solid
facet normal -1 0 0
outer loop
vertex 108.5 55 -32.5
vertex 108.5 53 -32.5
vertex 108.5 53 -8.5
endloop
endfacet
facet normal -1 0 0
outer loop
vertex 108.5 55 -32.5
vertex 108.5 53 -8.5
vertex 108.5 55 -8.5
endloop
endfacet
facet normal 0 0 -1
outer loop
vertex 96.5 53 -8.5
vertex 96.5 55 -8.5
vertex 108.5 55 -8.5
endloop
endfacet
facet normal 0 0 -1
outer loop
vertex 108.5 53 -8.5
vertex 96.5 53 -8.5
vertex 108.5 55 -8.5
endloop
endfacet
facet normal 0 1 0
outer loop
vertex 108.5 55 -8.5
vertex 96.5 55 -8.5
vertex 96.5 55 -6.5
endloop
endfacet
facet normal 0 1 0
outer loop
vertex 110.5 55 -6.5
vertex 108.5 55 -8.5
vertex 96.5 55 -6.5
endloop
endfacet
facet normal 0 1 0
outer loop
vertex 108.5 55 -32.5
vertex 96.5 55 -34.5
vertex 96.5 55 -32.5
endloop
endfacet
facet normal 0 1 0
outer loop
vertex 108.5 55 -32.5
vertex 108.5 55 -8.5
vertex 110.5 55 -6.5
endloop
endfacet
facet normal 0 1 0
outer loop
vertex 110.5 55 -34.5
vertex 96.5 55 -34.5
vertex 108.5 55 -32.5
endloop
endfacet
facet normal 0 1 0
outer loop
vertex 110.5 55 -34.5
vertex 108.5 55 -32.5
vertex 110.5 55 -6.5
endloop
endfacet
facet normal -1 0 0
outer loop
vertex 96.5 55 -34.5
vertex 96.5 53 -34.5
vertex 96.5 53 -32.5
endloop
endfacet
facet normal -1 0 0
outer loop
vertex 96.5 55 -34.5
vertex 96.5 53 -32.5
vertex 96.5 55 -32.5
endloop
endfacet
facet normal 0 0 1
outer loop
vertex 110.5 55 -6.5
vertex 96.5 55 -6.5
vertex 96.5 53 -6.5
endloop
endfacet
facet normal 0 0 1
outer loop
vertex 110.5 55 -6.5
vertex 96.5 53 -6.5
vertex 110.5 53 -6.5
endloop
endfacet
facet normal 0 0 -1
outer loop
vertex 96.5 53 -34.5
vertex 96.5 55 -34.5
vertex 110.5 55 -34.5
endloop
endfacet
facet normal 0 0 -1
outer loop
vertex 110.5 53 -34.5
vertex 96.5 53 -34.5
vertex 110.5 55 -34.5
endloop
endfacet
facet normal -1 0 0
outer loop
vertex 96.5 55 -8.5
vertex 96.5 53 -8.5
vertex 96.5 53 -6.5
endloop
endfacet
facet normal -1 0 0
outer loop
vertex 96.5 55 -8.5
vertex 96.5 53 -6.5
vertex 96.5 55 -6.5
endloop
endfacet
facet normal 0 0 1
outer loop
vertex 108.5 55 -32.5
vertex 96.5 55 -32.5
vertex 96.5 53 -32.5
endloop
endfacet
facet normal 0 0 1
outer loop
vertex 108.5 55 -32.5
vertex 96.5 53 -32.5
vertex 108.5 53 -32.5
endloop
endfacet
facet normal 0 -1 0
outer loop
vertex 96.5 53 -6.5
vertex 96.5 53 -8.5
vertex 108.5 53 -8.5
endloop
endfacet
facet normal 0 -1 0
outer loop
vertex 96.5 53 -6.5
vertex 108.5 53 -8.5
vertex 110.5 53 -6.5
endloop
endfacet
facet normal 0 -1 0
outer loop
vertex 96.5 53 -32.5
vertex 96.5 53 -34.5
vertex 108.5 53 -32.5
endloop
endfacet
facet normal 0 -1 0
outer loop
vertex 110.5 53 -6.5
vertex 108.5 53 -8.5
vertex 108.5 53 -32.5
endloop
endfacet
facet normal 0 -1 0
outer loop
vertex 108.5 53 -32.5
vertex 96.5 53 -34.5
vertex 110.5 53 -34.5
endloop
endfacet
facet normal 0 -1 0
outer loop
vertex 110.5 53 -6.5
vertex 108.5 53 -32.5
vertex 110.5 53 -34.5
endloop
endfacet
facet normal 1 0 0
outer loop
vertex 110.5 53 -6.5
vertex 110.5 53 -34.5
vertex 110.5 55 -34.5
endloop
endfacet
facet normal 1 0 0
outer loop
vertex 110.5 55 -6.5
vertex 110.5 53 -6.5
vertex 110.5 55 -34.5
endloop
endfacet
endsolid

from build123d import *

# Parameters (mm, degrees)
BOX244_W     = 12
BOX244_H     = 2
BOX244_DEPTH = 2
BOX245_W     = 12
BOX245_H     = 2
BOX245_DEPTH = 2
BOX243_W     = 2
BOX243_H     = 2
BOX243_DEPTH = 28


with BuildPart() as cube232:
    # Box244 → Box244 (new body)
    with BuildSketch(Plane(origin=(96.5, 53, -8.5), x_dir=(1, 0, 0), z_dir=(0, 0, 1))):
        with Locations((6, 1)):
            Rectangle(BOX244_W, BOX244_H)
    extrude(amount=BOX244_DEPTH)


with BuildPart() as cube233:
    # Box245 → Box245 (new body)
    with BuildSketch(Plane(origin=(96.5, 53, -34.5), x_dir=(1, 0, 0), z_dir=(0, 0, 1))):
        with Locations((6, 1)):
            Rectangle(BOX245_W, BOX245_H)
    extrude(amount=BOX245_DEPTH)


with BuildPart() as fusion077:
    # Box243 → Box243 (new body)
    with BuildSketch(Plane(origin=(108.5, 53, -34.5), x_dir=(1, 0, 0), z_dir=(0, 0, 1))):
        with Locations((1, 1)):
            Rectangle(BOX243_W, BOX243_H)
    extrude(amount=BOX243_DEPTH)

    # Fusion077: union Cube232, Cube233
    add(cube232.part)
    add(cube233.part)


solid = fusion077.part
